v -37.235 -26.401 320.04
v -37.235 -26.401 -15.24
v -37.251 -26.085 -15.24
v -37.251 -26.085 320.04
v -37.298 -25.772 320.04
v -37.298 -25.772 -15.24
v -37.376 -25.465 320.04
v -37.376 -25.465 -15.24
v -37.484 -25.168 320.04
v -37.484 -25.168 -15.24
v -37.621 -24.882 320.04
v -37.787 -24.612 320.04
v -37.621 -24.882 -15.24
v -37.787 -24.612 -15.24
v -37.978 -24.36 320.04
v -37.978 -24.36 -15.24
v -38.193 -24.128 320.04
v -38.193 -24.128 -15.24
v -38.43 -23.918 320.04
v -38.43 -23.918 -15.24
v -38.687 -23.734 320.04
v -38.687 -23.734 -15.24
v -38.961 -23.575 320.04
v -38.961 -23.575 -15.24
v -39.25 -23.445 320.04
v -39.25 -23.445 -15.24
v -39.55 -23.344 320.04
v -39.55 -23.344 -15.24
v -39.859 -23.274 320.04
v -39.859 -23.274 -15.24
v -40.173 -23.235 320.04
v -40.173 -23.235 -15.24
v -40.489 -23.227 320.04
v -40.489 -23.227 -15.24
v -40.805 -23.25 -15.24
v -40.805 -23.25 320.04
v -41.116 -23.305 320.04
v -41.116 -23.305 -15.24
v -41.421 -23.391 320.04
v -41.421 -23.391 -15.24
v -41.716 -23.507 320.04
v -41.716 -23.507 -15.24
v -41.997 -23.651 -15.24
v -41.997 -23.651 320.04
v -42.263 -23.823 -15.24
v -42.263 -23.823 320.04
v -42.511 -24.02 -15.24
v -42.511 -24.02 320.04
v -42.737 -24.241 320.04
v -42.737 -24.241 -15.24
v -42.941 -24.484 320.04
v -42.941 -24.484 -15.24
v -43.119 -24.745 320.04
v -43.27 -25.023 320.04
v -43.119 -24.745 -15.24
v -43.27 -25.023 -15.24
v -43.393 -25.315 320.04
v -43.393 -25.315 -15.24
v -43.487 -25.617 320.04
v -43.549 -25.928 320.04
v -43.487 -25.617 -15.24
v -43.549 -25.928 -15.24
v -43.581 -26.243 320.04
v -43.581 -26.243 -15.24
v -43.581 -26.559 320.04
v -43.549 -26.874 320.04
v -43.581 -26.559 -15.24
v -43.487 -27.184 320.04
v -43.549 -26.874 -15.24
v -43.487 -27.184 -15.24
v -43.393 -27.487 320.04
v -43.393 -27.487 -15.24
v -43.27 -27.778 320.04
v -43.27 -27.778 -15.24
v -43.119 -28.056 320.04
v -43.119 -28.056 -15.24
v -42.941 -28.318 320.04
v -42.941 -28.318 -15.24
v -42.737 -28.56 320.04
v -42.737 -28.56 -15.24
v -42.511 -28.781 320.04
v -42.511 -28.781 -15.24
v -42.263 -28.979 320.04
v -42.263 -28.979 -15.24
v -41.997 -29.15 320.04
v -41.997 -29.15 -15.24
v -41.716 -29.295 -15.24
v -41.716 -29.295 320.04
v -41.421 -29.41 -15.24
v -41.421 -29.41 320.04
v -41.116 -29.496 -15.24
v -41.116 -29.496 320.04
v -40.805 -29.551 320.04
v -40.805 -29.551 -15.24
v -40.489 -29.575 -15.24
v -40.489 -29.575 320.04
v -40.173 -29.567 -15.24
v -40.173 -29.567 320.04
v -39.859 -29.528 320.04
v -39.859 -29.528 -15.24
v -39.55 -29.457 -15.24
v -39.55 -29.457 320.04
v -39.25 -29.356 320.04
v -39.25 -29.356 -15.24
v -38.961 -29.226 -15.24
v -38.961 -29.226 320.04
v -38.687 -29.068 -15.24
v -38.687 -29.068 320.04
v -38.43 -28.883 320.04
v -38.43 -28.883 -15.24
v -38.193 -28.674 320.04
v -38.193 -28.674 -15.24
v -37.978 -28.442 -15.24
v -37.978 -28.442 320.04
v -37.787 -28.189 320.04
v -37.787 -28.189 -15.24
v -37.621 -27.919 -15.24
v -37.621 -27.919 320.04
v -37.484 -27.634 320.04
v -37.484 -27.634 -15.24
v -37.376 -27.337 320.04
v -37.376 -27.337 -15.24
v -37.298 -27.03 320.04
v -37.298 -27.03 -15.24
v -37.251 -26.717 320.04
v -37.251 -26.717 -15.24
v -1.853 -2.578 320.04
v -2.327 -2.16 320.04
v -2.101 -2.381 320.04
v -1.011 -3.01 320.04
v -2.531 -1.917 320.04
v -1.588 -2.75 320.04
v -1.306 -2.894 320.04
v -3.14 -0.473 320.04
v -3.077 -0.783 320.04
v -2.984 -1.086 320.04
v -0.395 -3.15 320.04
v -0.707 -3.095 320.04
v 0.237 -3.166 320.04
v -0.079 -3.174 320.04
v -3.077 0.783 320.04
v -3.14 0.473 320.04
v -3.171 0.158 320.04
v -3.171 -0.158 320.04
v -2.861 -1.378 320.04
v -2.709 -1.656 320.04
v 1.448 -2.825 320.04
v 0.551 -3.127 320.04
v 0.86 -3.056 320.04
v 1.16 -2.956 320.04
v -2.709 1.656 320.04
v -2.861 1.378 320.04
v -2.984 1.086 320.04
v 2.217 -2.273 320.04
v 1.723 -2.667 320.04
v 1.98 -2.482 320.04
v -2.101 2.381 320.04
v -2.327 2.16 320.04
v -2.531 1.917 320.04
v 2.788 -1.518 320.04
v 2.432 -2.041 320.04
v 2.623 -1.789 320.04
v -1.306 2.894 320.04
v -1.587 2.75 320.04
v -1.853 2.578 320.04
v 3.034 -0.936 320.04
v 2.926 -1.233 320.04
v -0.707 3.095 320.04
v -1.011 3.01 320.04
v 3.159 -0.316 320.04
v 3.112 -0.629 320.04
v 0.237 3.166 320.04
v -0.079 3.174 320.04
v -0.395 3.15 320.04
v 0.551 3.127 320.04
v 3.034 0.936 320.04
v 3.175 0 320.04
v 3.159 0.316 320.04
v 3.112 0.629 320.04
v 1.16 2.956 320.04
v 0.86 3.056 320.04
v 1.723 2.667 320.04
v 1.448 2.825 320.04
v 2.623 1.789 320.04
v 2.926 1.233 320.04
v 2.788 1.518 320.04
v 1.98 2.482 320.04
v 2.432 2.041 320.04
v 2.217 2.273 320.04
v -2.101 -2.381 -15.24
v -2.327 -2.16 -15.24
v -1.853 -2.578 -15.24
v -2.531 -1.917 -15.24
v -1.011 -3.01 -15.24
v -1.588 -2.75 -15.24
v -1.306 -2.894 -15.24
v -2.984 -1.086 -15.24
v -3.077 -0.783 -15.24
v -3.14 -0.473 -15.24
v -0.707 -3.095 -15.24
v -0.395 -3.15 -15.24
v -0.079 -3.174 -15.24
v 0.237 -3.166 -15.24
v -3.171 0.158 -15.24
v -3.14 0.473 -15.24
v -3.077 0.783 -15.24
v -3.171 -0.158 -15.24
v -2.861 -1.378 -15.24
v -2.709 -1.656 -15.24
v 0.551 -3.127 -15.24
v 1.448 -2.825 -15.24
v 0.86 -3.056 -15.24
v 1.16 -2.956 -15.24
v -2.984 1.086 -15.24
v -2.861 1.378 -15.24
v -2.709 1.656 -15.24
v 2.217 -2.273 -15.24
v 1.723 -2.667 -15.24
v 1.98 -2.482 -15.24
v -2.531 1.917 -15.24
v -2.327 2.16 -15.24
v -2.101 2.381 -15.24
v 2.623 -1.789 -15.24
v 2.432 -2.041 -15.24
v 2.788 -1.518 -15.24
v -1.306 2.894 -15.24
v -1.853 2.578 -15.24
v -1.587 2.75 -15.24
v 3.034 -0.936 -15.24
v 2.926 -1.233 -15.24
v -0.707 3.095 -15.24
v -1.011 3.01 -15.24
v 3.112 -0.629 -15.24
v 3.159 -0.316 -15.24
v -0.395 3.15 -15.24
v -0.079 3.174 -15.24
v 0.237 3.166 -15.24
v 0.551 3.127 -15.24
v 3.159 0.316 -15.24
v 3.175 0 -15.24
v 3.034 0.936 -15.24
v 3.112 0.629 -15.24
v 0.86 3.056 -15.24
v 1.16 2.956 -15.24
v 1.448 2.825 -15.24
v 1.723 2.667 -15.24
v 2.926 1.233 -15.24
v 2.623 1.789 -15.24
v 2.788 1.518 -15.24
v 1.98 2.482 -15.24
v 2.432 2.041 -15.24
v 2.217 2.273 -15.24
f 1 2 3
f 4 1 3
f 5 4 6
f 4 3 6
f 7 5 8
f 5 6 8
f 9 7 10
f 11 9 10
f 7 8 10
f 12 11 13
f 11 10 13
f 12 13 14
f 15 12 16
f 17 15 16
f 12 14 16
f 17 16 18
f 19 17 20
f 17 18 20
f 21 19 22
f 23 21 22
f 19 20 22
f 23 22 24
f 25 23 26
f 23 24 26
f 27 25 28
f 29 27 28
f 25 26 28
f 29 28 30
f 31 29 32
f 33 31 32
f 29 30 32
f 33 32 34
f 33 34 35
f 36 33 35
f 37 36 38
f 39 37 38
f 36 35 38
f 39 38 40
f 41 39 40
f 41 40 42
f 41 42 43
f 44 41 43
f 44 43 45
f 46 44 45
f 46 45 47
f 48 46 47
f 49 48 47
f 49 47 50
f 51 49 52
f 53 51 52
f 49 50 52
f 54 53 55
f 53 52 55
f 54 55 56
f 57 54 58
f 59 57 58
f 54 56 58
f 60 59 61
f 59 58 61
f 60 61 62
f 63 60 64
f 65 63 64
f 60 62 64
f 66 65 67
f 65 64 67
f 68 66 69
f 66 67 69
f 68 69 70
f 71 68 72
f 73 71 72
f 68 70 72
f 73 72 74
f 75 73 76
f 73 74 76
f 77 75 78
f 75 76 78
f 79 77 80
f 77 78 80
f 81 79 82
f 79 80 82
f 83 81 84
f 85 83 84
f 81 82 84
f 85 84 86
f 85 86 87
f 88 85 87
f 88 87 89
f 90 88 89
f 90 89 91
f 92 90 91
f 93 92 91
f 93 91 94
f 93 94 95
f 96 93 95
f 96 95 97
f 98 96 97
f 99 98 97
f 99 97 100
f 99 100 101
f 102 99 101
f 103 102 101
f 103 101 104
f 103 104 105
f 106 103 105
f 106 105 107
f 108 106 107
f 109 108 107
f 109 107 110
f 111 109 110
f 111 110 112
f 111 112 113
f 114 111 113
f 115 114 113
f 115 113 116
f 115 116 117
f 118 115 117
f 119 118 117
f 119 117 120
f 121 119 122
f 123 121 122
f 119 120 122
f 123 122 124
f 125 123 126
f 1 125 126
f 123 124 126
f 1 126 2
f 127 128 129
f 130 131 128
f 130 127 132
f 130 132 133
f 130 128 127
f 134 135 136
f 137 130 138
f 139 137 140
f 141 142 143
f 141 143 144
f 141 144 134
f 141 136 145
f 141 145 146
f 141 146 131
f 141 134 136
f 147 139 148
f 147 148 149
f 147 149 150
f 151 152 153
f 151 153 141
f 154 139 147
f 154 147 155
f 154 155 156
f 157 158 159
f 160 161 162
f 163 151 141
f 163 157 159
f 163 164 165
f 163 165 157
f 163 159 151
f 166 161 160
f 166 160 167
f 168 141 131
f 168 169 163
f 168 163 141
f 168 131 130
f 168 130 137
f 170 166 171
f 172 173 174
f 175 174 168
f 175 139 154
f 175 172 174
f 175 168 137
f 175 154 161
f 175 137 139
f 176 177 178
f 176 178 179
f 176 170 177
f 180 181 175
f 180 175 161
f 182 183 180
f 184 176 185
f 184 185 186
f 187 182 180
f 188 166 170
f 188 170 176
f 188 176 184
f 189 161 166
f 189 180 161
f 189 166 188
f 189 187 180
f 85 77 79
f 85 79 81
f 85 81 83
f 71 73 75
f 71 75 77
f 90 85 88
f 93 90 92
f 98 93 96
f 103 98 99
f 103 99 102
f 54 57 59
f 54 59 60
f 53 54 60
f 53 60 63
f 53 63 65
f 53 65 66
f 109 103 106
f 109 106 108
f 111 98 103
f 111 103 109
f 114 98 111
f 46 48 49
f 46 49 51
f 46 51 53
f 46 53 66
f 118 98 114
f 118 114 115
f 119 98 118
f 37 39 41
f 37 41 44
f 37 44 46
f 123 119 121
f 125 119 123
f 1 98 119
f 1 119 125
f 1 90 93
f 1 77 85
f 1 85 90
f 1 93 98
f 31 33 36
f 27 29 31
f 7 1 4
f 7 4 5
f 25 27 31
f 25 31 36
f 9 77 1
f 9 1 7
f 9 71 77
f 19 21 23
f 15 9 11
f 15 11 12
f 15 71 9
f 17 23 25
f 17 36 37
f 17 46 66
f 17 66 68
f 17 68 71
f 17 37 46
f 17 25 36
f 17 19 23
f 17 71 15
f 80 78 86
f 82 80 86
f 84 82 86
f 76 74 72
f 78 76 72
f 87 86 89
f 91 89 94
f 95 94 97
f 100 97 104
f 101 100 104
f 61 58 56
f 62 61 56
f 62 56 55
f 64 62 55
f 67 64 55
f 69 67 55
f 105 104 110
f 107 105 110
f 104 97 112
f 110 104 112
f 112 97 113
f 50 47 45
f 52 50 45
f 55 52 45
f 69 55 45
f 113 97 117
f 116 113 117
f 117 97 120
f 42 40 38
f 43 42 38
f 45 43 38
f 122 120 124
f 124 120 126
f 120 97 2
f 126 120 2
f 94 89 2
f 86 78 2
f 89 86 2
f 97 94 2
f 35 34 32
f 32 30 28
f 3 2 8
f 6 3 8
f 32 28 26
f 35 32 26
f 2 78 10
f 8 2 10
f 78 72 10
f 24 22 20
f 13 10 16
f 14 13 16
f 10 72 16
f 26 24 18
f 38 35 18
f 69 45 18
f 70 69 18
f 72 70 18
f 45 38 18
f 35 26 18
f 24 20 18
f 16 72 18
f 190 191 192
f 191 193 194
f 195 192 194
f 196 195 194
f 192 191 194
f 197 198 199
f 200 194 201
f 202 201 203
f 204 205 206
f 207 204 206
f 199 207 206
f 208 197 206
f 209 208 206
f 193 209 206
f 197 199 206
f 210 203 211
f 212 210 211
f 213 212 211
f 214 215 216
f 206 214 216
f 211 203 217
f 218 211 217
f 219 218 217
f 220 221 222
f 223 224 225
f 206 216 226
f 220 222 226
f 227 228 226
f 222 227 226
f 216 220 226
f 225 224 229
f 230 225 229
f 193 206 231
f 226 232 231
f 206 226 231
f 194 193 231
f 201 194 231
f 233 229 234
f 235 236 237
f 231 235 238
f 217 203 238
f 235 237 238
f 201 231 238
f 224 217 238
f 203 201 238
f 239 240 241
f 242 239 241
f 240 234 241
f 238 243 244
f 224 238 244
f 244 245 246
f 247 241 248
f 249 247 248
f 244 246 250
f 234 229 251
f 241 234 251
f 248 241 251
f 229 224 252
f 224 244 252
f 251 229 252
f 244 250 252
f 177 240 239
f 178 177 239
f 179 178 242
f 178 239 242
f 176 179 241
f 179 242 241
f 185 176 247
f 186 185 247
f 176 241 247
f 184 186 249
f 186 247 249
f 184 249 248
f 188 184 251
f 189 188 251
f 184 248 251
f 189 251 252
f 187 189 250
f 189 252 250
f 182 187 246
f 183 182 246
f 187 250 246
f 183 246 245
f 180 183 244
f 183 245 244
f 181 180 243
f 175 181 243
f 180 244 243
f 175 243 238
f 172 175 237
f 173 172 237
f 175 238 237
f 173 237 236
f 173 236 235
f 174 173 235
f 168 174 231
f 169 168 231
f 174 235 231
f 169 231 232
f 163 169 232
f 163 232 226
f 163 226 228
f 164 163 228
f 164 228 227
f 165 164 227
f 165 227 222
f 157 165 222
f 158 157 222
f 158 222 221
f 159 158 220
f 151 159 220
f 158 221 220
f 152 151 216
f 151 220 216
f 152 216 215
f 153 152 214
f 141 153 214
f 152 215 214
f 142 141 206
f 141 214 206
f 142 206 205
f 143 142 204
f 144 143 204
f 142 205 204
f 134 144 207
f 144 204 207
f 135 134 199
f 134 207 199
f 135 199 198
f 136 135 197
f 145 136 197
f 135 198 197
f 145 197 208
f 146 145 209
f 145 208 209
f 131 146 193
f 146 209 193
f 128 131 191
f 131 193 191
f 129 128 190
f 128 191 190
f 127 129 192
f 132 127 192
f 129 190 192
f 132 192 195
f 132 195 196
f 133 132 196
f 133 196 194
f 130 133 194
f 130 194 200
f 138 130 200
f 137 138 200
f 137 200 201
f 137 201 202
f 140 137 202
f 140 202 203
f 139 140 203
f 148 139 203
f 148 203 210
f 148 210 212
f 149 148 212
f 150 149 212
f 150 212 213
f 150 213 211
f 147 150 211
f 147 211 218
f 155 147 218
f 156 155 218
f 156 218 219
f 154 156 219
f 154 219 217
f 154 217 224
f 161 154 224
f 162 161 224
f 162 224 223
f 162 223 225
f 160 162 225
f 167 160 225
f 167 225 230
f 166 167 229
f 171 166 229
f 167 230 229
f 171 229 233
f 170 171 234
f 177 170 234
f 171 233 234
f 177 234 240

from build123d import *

# Parameters (mm, degrees)
BOSS_EXTRUDE1_START     = -335.28
BOSS_EXTRUDE1_OUTLINE_R = 3.175
BOSS_EXTRUDE1_DEPTH     = 335.28


# Read off the part's stored shape, not the designer's step: Boss-Extrude1
with BuildPart() as part:
    # Boss-Extrude1 outline → Boss-Extrude1 (new body)
    with BuildSketch(Plane.XY.offset(320.04).offset(BOSS_EXTRUDE1_START)):
        with Locations((-40.409844034, -26.400791933)):
            Circle(BOSS_EXTRUDE1_OUTLINE_R)
        Circle(BOSS_EXTRUDE1_OUTLINE_R)
    extrude(amount=BOSS_EXTRUDE1_DEPTH)


solid = part.part
